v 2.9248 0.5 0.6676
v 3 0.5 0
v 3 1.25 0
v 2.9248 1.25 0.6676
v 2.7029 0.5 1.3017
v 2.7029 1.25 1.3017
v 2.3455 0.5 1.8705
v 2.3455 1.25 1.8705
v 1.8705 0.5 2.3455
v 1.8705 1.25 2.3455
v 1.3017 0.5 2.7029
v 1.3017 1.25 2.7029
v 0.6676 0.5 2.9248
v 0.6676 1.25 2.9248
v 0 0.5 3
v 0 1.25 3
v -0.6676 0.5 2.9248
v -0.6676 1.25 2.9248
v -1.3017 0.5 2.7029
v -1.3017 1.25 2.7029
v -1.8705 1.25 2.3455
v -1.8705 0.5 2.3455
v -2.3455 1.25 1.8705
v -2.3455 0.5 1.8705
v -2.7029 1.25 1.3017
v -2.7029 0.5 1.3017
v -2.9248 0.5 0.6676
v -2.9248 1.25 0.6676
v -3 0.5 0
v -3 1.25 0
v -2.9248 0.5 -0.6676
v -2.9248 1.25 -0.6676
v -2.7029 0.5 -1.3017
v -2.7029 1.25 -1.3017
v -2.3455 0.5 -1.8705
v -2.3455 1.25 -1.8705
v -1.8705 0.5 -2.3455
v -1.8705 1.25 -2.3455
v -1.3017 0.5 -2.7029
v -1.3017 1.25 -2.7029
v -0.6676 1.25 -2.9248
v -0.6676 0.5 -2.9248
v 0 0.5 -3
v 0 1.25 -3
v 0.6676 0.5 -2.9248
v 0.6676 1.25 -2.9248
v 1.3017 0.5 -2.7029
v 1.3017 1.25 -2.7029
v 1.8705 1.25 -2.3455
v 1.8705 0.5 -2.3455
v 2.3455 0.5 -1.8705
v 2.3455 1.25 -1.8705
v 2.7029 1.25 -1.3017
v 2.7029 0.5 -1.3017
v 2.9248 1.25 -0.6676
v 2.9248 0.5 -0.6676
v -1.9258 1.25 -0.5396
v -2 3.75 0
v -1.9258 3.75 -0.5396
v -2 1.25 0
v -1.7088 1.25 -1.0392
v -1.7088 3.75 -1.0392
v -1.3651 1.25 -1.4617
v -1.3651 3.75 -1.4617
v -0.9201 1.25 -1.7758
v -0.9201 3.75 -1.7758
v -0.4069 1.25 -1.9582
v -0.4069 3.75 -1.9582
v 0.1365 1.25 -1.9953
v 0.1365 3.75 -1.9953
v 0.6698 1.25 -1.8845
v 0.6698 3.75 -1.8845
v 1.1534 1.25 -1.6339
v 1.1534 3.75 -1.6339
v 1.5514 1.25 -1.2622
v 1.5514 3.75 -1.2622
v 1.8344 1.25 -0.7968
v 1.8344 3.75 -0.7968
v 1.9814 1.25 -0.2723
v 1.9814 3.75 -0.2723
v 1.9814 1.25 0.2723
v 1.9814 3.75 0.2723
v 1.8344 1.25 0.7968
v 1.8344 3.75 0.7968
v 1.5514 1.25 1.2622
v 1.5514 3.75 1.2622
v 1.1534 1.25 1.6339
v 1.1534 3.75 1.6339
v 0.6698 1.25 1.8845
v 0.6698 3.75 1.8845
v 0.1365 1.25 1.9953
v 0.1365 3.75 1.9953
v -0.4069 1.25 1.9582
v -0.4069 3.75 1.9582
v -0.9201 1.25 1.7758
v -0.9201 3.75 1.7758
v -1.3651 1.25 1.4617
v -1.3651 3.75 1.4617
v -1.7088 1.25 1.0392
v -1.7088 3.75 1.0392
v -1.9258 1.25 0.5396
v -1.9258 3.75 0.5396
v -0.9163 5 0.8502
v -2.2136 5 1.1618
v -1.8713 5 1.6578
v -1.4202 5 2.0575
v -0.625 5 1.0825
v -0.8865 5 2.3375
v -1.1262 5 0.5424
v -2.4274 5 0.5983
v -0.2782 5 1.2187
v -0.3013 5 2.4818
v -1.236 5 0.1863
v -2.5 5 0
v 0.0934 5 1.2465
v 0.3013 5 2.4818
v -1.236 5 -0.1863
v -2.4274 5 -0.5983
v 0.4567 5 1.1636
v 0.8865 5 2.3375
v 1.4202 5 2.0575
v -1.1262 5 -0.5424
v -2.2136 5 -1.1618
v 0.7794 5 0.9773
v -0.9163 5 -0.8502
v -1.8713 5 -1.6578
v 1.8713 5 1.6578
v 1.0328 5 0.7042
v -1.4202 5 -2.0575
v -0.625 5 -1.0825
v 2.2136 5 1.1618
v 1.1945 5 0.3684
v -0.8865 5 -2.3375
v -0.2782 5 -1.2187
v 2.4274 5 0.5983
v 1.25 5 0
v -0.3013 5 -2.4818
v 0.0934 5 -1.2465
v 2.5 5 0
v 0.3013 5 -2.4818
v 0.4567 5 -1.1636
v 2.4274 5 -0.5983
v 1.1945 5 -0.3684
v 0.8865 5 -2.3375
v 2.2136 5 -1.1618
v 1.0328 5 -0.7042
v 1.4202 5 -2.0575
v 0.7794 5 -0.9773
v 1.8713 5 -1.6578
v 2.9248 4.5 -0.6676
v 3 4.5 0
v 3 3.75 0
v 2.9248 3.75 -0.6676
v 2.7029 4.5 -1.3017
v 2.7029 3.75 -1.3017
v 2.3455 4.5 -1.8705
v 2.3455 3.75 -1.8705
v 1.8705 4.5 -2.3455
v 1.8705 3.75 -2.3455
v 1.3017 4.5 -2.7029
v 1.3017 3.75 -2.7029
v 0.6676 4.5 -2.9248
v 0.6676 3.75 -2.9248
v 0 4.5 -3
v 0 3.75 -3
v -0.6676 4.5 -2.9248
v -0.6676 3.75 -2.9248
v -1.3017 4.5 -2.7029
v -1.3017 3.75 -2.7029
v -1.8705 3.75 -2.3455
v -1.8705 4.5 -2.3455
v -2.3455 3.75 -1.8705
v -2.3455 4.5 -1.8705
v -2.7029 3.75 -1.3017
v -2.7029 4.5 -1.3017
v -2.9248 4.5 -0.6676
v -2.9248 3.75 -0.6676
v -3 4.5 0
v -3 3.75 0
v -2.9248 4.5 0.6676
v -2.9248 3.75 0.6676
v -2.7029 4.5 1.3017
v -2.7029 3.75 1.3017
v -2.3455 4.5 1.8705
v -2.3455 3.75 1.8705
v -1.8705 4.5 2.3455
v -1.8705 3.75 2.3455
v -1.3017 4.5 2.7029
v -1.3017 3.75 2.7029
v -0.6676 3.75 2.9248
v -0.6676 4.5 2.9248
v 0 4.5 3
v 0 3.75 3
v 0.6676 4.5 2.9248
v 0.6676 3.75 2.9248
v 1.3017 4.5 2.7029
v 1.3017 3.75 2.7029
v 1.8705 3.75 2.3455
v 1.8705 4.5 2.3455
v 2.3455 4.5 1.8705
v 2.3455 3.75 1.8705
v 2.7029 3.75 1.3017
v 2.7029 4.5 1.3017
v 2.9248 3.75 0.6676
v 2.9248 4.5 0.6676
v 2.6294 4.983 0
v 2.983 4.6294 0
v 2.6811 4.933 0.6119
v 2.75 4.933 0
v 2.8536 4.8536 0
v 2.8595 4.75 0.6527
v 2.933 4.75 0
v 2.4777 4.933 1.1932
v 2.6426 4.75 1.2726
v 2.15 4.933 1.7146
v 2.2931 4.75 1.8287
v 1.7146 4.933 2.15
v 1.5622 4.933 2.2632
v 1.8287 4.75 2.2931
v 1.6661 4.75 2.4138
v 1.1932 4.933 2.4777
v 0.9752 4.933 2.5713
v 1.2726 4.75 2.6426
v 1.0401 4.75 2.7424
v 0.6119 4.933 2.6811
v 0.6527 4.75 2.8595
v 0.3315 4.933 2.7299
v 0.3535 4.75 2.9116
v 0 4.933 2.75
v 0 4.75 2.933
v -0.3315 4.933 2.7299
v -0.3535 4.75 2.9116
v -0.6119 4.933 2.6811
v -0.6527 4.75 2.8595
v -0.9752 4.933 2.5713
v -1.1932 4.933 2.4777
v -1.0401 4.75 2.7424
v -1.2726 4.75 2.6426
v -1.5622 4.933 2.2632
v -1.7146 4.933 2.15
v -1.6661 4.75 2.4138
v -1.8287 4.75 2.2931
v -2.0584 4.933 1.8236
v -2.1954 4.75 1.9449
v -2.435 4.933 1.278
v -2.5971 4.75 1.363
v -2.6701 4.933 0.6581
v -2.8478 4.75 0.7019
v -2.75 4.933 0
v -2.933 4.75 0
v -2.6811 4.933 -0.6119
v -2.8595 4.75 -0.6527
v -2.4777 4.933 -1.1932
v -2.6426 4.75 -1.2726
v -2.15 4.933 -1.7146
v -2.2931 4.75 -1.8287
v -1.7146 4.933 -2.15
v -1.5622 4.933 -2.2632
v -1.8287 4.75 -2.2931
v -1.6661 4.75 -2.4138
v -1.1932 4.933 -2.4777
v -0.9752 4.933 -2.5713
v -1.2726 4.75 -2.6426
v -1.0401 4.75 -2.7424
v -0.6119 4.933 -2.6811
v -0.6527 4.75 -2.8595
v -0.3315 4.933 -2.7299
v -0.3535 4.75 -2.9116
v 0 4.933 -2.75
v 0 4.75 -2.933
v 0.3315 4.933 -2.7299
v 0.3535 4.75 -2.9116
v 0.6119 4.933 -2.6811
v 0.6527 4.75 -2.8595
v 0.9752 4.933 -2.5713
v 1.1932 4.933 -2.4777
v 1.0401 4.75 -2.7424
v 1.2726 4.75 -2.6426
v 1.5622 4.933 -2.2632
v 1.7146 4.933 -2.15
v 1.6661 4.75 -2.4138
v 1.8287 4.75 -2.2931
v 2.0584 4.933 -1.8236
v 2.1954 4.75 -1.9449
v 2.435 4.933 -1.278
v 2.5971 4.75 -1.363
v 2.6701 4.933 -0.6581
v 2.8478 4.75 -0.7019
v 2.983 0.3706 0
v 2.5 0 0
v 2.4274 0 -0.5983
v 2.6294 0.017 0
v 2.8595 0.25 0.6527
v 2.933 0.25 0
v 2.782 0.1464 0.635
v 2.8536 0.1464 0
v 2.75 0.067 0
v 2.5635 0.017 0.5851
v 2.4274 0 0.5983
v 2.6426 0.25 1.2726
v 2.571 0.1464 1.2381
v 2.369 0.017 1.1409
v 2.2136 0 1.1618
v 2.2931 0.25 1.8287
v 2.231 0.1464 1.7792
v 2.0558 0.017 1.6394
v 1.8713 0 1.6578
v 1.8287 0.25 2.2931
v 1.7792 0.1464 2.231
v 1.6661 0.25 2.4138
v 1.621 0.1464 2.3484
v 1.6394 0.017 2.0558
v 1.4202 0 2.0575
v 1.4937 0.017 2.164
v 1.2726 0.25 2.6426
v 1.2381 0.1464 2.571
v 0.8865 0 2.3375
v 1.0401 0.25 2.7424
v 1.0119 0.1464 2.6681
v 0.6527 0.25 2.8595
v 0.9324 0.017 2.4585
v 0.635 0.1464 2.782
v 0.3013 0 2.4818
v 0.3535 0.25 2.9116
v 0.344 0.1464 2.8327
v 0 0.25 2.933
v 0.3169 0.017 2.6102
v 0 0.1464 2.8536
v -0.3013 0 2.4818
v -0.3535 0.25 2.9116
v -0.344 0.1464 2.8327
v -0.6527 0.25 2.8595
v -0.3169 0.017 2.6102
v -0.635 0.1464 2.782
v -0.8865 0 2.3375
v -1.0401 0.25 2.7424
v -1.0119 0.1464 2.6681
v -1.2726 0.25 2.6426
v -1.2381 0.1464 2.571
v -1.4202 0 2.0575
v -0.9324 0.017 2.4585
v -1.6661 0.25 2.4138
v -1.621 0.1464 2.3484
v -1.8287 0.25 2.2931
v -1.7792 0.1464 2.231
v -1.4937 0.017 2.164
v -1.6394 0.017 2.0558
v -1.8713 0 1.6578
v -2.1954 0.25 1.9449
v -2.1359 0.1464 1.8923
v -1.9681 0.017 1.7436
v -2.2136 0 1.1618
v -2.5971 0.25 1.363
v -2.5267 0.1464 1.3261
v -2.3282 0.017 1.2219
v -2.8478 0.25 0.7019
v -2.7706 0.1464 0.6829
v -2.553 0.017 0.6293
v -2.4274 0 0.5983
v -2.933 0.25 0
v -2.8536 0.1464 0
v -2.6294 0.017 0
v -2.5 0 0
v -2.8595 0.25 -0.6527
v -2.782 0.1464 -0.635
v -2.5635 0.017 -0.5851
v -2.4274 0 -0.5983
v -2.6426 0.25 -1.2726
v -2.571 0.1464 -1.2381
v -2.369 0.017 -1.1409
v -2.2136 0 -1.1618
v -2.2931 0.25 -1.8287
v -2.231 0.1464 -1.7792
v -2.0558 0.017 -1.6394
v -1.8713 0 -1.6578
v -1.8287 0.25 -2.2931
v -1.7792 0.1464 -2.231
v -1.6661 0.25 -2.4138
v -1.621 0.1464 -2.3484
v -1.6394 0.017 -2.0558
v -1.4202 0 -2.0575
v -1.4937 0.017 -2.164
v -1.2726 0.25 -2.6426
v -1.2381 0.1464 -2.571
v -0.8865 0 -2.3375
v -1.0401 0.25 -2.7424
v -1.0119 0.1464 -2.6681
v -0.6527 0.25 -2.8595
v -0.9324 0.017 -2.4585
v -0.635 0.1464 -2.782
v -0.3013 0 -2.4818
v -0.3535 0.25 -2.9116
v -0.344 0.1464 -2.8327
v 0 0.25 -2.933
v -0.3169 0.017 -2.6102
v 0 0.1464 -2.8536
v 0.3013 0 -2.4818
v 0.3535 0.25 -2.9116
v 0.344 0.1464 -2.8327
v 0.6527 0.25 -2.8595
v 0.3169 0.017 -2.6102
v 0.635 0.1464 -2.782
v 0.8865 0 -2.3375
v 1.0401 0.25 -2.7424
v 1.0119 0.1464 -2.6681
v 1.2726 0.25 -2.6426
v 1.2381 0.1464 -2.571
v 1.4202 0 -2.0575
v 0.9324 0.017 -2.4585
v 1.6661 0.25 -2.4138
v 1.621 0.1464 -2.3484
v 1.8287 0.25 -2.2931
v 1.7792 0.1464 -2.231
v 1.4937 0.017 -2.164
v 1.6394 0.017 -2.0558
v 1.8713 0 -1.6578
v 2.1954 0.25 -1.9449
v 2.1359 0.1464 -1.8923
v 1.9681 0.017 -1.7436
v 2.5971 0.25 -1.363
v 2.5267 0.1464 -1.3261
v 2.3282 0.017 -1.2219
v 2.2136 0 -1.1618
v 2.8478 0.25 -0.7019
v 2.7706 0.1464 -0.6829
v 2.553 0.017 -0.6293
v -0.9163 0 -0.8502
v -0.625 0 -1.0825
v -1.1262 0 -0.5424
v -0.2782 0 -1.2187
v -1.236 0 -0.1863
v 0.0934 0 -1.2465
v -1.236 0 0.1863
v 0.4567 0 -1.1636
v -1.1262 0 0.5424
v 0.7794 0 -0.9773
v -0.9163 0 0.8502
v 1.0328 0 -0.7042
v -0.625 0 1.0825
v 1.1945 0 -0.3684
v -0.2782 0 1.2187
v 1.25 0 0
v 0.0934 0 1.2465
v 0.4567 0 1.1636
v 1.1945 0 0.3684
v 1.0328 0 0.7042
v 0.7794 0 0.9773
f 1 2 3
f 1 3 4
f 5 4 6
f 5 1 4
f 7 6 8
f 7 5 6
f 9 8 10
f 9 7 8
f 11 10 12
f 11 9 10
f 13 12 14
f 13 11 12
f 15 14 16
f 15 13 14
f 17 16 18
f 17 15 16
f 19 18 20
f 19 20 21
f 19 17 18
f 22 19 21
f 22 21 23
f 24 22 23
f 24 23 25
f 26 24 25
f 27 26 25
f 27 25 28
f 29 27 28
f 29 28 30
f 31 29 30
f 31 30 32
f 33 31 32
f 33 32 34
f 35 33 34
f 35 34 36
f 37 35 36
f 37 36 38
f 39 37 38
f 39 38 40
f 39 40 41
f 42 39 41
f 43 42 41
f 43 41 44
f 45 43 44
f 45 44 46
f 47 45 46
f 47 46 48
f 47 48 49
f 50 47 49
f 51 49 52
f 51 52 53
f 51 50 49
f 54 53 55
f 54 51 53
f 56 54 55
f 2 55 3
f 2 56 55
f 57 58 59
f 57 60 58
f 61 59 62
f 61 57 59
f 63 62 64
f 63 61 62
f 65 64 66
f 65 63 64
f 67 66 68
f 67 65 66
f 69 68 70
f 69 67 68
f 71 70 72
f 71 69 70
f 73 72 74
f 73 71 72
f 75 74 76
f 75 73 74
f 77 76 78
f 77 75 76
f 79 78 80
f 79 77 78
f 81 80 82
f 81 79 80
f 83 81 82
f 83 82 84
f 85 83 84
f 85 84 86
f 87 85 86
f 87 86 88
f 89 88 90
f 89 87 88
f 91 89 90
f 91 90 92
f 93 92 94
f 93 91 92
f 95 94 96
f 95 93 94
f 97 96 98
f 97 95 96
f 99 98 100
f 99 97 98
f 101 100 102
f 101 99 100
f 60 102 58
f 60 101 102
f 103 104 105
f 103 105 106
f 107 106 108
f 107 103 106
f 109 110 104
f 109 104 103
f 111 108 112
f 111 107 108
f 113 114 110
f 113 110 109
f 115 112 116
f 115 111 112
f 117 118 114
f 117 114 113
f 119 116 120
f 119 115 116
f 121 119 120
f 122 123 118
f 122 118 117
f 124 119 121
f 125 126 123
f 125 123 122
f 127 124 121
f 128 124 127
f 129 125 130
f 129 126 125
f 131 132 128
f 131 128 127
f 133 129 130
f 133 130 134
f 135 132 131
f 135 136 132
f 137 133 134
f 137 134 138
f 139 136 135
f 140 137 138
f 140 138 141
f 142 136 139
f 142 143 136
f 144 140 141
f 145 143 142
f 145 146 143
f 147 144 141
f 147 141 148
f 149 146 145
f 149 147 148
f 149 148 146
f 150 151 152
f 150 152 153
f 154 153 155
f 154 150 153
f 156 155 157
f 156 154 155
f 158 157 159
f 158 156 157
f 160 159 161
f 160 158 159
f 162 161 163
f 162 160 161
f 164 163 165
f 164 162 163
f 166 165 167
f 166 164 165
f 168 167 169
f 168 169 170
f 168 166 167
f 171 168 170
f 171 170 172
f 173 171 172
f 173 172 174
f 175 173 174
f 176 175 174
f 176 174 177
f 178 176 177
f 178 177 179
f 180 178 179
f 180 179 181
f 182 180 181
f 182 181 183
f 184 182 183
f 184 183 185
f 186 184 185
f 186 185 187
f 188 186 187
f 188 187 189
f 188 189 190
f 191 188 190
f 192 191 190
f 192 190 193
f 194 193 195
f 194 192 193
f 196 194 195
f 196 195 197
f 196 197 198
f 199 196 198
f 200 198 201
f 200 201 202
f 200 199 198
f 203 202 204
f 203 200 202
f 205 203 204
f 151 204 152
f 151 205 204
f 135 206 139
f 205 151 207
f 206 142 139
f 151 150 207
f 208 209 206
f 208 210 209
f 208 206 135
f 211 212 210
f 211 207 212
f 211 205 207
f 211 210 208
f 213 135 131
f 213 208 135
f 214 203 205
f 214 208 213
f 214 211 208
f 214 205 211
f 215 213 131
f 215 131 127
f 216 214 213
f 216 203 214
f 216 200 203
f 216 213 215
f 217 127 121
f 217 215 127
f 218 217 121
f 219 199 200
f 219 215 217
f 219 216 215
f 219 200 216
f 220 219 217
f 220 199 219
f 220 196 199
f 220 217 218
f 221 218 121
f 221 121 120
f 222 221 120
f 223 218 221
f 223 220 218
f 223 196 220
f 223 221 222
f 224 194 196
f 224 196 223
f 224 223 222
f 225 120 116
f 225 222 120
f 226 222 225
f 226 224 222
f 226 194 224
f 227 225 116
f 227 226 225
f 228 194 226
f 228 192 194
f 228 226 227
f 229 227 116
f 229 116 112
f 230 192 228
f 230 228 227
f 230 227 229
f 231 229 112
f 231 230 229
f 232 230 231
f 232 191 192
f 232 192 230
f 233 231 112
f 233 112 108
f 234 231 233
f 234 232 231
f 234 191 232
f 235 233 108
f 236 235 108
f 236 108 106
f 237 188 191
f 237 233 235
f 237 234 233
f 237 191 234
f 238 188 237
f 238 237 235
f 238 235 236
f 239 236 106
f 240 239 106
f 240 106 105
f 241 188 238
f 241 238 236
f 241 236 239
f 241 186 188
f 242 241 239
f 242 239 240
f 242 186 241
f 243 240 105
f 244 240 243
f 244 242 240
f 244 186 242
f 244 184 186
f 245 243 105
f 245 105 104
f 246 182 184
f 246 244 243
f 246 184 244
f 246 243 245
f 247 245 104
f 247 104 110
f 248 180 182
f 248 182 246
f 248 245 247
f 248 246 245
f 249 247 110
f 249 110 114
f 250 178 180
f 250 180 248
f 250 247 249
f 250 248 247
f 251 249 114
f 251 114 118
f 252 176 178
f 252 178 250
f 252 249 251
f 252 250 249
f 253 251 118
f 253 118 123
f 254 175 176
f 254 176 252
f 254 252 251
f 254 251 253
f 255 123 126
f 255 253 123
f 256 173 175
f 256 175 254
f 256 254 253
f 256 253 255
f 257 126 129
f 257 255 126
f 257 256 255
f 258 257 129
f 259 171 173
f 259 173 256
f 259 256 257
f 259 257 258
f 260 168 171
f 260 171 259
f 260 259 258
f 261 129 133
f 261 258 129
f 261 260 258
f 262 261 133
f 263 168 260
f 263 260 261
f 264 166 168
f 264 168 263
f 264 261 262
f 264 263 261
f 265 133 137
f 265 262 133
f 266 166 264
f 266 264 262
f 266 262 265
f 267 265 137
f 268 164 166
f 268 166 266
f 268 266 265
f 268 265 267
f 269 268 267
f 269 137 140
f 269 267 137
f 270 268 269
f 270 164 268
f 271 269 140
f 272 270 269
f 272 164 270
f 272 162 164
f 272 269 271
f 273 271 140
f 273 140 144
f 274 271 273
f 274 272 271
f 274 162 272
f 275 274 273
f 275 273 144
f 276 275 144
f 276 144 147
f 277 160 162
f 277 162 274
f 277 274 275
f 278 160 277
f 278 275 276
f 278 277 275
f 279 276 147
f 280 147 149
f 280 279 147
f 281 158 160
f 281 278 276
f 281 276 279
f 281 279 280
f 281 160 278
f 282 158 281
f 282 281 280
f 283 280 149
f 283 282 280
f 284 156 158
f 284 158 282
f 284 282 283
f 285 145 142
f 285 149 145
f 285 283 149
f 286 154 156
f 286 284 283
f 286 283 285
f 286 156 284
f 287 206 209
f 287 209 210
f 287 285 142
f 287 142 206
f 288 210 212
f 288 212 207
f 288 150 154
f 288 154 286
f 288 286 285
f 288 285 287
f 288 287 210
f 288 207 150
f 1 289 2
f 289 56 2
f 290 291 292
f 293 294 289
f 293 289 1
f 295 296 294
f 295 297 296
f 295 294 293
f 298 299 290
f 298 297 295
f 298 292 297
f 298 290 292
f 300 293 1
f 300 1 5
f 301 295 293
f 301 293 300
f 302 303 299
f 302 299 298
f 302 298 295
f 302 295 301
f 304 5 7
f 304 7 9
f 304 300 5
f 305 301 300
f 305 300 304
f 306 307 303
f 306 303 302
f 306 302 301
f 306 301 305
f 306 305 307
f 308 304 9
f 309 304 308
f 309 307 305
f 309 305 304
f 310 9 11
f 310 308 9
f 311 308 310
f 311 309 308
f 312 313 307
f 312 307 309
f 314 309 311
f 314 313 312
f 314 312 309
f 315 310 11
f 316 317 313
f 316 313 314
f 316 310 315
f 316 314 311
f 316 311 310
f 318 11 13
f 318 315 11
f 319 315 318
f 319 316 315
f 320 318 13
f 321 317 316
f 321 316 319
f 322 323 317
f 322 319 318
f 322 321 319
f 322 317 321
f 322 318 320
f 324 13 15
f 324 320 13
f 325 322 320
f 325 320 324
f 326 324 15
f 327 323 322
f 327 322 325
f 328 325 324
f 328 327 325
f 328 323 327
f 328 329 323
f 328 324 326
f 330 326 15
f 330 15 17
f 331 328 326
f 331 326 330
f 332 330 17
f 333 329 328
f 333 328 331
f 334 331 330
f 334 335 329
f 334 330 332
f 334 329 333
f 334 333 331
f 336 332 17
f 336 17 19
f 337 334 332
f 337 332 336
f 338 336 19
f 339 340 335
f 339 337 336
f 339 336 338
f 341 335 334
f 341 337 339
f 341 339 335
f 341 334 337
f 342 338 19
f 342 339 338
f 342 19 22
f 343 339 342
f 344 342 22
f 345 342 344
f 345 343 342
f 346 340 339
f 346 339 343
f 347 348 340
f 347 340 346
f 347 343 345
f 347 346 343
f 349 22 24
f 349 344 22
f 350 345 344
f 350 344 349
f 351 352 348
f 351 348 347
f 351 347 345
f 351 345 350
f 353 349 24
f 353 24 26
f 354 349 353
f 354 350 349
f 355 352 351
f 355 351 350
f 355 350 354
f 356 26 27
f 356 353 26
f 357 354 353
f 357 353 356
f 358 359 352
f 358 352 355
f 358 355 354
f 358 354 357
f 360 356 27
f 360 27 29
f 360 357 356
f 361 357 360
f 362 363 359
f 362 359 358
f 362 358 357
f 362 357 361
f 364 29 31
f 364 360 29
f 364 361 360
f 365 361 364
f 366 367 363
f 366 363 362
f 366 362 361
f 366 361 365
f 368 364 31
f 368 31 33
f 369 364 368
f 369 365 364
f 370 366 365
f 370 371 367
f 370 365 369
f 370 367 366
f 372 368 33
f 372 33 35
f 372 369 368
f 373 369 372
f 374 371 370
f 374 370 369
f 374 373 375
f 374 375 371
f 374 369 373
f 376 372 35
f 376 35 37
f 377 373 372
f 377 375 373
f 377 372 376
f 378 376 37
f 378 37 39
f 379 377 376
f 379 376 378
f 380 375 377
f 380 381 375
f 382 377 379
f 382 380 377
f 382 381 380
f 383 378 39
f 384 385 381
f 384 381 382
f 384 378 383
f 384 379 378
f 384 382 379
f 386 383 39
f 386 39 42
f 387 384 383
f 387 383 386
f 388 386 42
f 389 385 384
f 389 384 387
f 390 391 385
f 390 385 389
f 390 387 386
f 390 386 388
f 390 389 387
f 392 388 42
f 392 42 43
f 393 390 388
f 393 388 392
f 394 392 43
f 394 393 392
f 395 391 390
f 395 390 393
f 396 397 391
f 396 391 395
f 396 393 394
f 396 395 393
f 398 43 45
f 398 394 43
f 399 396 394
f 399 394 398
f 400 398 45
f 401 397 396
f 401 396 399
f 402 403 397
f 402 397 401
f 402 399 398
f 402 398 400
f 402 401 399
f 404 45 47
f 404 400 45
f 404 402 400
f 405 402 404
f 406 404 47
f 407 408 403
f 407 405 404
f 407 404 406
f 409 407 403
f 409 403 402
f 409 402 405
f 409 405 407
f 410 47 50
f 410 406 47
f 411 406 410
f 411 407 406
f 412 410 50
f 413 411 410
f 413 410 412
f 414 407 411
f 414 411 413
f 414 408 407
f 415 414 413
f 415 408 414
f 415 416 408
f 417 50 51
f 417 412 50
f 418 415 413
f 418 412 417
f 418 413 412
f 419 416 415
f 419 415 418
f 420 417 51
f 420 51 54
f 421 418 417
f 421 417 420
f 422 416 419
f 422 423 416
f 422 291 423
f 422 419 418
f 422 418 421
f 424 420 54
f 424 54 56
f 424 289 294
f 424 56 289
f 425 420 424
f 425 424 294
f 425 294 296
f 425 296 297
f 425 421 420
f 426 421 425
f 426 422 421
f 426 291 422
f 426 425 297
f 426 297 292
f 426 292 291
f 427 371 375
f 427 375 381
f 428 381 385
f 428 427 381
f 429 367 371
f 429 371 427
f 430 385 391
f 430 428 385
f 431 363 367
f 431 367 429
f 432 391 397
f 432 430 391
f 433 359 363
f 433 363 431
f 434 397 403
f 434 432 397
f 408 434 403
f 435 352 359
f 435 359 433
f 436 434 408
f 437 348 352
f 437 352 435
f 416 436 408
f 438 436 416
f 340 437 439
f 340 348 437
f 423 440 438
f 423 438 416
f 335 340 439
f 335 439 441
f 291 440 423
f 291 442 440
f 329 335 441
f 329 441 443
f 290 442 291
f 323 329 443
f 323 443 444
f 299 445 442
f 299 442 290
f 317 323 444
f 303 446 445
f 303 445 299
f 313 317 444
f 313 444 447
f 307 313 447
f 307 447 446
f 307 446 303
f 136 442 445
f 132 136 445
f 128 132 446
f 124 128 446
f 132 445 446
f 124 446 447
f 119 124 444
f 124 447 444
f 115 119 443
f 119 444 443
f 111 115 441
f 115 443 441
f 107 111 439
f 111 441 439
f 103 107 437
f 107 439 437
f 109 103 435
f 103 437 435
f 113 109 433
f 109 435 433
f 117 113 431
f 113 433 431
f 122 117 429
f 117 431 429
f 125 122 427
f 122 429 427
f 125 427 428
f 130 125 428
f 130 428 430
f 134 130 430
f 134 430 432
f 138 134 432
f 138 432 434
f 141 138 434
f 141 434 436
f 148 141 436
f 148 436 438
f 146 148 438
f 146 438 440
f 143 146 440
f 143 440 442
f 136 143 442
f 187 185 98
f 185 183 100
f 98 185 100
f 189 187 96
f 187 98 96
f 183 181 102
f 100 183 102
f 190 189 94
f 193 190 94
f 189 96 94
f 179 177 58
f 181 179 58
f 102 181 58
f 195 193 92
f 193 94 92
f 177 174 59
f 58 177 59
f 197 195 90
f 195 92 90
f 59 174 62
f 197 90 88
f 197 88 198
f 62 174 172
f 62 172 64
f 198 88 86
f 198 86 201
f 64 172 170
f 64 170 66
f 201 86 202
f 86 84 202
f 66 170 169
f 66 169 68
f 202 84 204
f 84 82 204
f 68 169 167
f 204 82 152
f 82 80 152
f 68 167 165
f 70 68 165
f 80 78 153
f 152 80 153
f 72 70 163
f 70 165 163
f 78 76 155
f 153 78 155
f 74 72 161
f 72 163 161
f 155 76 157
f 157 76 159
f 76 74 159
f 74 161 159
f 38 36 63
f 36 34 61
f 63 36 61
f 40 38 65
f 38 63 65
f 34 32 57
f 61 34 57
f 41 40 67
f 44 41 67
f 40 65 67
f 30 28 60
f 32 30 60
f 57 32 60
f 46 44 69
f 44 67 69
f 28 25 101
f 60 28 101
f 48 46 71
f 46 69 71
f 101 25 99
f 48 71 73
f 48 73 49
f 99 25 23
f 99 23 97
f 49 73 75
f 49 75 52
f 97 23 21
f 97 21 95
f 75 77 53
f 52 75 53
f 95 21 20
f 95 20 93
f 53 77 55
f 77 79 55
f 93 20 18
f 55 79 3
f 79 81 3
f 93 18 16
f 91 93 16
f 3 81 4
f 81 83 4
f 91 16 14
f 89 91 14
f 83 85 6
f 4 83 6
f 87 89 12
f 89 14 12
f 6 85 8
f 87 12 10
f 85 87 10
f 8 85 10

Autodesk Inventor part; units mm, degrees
ref_plane "YZ Plane" through (0, 0, 0) normal (1, 0, 0) x (0, 1, 0)
ref_plane "XZ Plane" through (0, 0, 0) normal (0, 1, 0) x (-1, 0, 0)
ref_plane "XY Plane" through (0, 0, 0) normal (0, 0, 1) x (1, 0, 0)
sketch "Эскиз1" plane through (0, 0, 0) normal (0, 1, 0) x (-1, 0, 0)
  circle A0 centre (0, 0) radius 2
  dimension "d0" = 4
extrude "Выдавливание1" add sketch "Эскиз1" along normal blind 5
sketch "Эскиз2" plane through (0, 5, 0) normal (0, 1, 0) x (1, 0, 0)
  circle A0 centre (0, 0) radius 3
  dimension "d3" = 6
extrude "Выдавливание2" add sketch "Эскиз2" against normal blind 1.25
sketch "Эскиз3" plane through (0, 0, 0) normal (0, -1, 0) x (1, 0, 0)
  circle A0 centre (0, 0) radius 3
extrude "Выдавливание3" add sketch "Эскиз3" against normal blind 1.25
sketch "Эскиз4" plane through (0, 0, 0) normal (0, -1, 0) x (1, 0, 0)
  circle A0 centre (0, 0) radius 1.25
  dimension "d12" = 2.5
extrude "Выдавливание4" cut sketch "Эскиз4" against normal blind 12
fillet "Сопряжение1" radius 0.5 2 edges at (-3, 0, 0) (-3, 5, 0)
properties part number "vtulka_servo"
